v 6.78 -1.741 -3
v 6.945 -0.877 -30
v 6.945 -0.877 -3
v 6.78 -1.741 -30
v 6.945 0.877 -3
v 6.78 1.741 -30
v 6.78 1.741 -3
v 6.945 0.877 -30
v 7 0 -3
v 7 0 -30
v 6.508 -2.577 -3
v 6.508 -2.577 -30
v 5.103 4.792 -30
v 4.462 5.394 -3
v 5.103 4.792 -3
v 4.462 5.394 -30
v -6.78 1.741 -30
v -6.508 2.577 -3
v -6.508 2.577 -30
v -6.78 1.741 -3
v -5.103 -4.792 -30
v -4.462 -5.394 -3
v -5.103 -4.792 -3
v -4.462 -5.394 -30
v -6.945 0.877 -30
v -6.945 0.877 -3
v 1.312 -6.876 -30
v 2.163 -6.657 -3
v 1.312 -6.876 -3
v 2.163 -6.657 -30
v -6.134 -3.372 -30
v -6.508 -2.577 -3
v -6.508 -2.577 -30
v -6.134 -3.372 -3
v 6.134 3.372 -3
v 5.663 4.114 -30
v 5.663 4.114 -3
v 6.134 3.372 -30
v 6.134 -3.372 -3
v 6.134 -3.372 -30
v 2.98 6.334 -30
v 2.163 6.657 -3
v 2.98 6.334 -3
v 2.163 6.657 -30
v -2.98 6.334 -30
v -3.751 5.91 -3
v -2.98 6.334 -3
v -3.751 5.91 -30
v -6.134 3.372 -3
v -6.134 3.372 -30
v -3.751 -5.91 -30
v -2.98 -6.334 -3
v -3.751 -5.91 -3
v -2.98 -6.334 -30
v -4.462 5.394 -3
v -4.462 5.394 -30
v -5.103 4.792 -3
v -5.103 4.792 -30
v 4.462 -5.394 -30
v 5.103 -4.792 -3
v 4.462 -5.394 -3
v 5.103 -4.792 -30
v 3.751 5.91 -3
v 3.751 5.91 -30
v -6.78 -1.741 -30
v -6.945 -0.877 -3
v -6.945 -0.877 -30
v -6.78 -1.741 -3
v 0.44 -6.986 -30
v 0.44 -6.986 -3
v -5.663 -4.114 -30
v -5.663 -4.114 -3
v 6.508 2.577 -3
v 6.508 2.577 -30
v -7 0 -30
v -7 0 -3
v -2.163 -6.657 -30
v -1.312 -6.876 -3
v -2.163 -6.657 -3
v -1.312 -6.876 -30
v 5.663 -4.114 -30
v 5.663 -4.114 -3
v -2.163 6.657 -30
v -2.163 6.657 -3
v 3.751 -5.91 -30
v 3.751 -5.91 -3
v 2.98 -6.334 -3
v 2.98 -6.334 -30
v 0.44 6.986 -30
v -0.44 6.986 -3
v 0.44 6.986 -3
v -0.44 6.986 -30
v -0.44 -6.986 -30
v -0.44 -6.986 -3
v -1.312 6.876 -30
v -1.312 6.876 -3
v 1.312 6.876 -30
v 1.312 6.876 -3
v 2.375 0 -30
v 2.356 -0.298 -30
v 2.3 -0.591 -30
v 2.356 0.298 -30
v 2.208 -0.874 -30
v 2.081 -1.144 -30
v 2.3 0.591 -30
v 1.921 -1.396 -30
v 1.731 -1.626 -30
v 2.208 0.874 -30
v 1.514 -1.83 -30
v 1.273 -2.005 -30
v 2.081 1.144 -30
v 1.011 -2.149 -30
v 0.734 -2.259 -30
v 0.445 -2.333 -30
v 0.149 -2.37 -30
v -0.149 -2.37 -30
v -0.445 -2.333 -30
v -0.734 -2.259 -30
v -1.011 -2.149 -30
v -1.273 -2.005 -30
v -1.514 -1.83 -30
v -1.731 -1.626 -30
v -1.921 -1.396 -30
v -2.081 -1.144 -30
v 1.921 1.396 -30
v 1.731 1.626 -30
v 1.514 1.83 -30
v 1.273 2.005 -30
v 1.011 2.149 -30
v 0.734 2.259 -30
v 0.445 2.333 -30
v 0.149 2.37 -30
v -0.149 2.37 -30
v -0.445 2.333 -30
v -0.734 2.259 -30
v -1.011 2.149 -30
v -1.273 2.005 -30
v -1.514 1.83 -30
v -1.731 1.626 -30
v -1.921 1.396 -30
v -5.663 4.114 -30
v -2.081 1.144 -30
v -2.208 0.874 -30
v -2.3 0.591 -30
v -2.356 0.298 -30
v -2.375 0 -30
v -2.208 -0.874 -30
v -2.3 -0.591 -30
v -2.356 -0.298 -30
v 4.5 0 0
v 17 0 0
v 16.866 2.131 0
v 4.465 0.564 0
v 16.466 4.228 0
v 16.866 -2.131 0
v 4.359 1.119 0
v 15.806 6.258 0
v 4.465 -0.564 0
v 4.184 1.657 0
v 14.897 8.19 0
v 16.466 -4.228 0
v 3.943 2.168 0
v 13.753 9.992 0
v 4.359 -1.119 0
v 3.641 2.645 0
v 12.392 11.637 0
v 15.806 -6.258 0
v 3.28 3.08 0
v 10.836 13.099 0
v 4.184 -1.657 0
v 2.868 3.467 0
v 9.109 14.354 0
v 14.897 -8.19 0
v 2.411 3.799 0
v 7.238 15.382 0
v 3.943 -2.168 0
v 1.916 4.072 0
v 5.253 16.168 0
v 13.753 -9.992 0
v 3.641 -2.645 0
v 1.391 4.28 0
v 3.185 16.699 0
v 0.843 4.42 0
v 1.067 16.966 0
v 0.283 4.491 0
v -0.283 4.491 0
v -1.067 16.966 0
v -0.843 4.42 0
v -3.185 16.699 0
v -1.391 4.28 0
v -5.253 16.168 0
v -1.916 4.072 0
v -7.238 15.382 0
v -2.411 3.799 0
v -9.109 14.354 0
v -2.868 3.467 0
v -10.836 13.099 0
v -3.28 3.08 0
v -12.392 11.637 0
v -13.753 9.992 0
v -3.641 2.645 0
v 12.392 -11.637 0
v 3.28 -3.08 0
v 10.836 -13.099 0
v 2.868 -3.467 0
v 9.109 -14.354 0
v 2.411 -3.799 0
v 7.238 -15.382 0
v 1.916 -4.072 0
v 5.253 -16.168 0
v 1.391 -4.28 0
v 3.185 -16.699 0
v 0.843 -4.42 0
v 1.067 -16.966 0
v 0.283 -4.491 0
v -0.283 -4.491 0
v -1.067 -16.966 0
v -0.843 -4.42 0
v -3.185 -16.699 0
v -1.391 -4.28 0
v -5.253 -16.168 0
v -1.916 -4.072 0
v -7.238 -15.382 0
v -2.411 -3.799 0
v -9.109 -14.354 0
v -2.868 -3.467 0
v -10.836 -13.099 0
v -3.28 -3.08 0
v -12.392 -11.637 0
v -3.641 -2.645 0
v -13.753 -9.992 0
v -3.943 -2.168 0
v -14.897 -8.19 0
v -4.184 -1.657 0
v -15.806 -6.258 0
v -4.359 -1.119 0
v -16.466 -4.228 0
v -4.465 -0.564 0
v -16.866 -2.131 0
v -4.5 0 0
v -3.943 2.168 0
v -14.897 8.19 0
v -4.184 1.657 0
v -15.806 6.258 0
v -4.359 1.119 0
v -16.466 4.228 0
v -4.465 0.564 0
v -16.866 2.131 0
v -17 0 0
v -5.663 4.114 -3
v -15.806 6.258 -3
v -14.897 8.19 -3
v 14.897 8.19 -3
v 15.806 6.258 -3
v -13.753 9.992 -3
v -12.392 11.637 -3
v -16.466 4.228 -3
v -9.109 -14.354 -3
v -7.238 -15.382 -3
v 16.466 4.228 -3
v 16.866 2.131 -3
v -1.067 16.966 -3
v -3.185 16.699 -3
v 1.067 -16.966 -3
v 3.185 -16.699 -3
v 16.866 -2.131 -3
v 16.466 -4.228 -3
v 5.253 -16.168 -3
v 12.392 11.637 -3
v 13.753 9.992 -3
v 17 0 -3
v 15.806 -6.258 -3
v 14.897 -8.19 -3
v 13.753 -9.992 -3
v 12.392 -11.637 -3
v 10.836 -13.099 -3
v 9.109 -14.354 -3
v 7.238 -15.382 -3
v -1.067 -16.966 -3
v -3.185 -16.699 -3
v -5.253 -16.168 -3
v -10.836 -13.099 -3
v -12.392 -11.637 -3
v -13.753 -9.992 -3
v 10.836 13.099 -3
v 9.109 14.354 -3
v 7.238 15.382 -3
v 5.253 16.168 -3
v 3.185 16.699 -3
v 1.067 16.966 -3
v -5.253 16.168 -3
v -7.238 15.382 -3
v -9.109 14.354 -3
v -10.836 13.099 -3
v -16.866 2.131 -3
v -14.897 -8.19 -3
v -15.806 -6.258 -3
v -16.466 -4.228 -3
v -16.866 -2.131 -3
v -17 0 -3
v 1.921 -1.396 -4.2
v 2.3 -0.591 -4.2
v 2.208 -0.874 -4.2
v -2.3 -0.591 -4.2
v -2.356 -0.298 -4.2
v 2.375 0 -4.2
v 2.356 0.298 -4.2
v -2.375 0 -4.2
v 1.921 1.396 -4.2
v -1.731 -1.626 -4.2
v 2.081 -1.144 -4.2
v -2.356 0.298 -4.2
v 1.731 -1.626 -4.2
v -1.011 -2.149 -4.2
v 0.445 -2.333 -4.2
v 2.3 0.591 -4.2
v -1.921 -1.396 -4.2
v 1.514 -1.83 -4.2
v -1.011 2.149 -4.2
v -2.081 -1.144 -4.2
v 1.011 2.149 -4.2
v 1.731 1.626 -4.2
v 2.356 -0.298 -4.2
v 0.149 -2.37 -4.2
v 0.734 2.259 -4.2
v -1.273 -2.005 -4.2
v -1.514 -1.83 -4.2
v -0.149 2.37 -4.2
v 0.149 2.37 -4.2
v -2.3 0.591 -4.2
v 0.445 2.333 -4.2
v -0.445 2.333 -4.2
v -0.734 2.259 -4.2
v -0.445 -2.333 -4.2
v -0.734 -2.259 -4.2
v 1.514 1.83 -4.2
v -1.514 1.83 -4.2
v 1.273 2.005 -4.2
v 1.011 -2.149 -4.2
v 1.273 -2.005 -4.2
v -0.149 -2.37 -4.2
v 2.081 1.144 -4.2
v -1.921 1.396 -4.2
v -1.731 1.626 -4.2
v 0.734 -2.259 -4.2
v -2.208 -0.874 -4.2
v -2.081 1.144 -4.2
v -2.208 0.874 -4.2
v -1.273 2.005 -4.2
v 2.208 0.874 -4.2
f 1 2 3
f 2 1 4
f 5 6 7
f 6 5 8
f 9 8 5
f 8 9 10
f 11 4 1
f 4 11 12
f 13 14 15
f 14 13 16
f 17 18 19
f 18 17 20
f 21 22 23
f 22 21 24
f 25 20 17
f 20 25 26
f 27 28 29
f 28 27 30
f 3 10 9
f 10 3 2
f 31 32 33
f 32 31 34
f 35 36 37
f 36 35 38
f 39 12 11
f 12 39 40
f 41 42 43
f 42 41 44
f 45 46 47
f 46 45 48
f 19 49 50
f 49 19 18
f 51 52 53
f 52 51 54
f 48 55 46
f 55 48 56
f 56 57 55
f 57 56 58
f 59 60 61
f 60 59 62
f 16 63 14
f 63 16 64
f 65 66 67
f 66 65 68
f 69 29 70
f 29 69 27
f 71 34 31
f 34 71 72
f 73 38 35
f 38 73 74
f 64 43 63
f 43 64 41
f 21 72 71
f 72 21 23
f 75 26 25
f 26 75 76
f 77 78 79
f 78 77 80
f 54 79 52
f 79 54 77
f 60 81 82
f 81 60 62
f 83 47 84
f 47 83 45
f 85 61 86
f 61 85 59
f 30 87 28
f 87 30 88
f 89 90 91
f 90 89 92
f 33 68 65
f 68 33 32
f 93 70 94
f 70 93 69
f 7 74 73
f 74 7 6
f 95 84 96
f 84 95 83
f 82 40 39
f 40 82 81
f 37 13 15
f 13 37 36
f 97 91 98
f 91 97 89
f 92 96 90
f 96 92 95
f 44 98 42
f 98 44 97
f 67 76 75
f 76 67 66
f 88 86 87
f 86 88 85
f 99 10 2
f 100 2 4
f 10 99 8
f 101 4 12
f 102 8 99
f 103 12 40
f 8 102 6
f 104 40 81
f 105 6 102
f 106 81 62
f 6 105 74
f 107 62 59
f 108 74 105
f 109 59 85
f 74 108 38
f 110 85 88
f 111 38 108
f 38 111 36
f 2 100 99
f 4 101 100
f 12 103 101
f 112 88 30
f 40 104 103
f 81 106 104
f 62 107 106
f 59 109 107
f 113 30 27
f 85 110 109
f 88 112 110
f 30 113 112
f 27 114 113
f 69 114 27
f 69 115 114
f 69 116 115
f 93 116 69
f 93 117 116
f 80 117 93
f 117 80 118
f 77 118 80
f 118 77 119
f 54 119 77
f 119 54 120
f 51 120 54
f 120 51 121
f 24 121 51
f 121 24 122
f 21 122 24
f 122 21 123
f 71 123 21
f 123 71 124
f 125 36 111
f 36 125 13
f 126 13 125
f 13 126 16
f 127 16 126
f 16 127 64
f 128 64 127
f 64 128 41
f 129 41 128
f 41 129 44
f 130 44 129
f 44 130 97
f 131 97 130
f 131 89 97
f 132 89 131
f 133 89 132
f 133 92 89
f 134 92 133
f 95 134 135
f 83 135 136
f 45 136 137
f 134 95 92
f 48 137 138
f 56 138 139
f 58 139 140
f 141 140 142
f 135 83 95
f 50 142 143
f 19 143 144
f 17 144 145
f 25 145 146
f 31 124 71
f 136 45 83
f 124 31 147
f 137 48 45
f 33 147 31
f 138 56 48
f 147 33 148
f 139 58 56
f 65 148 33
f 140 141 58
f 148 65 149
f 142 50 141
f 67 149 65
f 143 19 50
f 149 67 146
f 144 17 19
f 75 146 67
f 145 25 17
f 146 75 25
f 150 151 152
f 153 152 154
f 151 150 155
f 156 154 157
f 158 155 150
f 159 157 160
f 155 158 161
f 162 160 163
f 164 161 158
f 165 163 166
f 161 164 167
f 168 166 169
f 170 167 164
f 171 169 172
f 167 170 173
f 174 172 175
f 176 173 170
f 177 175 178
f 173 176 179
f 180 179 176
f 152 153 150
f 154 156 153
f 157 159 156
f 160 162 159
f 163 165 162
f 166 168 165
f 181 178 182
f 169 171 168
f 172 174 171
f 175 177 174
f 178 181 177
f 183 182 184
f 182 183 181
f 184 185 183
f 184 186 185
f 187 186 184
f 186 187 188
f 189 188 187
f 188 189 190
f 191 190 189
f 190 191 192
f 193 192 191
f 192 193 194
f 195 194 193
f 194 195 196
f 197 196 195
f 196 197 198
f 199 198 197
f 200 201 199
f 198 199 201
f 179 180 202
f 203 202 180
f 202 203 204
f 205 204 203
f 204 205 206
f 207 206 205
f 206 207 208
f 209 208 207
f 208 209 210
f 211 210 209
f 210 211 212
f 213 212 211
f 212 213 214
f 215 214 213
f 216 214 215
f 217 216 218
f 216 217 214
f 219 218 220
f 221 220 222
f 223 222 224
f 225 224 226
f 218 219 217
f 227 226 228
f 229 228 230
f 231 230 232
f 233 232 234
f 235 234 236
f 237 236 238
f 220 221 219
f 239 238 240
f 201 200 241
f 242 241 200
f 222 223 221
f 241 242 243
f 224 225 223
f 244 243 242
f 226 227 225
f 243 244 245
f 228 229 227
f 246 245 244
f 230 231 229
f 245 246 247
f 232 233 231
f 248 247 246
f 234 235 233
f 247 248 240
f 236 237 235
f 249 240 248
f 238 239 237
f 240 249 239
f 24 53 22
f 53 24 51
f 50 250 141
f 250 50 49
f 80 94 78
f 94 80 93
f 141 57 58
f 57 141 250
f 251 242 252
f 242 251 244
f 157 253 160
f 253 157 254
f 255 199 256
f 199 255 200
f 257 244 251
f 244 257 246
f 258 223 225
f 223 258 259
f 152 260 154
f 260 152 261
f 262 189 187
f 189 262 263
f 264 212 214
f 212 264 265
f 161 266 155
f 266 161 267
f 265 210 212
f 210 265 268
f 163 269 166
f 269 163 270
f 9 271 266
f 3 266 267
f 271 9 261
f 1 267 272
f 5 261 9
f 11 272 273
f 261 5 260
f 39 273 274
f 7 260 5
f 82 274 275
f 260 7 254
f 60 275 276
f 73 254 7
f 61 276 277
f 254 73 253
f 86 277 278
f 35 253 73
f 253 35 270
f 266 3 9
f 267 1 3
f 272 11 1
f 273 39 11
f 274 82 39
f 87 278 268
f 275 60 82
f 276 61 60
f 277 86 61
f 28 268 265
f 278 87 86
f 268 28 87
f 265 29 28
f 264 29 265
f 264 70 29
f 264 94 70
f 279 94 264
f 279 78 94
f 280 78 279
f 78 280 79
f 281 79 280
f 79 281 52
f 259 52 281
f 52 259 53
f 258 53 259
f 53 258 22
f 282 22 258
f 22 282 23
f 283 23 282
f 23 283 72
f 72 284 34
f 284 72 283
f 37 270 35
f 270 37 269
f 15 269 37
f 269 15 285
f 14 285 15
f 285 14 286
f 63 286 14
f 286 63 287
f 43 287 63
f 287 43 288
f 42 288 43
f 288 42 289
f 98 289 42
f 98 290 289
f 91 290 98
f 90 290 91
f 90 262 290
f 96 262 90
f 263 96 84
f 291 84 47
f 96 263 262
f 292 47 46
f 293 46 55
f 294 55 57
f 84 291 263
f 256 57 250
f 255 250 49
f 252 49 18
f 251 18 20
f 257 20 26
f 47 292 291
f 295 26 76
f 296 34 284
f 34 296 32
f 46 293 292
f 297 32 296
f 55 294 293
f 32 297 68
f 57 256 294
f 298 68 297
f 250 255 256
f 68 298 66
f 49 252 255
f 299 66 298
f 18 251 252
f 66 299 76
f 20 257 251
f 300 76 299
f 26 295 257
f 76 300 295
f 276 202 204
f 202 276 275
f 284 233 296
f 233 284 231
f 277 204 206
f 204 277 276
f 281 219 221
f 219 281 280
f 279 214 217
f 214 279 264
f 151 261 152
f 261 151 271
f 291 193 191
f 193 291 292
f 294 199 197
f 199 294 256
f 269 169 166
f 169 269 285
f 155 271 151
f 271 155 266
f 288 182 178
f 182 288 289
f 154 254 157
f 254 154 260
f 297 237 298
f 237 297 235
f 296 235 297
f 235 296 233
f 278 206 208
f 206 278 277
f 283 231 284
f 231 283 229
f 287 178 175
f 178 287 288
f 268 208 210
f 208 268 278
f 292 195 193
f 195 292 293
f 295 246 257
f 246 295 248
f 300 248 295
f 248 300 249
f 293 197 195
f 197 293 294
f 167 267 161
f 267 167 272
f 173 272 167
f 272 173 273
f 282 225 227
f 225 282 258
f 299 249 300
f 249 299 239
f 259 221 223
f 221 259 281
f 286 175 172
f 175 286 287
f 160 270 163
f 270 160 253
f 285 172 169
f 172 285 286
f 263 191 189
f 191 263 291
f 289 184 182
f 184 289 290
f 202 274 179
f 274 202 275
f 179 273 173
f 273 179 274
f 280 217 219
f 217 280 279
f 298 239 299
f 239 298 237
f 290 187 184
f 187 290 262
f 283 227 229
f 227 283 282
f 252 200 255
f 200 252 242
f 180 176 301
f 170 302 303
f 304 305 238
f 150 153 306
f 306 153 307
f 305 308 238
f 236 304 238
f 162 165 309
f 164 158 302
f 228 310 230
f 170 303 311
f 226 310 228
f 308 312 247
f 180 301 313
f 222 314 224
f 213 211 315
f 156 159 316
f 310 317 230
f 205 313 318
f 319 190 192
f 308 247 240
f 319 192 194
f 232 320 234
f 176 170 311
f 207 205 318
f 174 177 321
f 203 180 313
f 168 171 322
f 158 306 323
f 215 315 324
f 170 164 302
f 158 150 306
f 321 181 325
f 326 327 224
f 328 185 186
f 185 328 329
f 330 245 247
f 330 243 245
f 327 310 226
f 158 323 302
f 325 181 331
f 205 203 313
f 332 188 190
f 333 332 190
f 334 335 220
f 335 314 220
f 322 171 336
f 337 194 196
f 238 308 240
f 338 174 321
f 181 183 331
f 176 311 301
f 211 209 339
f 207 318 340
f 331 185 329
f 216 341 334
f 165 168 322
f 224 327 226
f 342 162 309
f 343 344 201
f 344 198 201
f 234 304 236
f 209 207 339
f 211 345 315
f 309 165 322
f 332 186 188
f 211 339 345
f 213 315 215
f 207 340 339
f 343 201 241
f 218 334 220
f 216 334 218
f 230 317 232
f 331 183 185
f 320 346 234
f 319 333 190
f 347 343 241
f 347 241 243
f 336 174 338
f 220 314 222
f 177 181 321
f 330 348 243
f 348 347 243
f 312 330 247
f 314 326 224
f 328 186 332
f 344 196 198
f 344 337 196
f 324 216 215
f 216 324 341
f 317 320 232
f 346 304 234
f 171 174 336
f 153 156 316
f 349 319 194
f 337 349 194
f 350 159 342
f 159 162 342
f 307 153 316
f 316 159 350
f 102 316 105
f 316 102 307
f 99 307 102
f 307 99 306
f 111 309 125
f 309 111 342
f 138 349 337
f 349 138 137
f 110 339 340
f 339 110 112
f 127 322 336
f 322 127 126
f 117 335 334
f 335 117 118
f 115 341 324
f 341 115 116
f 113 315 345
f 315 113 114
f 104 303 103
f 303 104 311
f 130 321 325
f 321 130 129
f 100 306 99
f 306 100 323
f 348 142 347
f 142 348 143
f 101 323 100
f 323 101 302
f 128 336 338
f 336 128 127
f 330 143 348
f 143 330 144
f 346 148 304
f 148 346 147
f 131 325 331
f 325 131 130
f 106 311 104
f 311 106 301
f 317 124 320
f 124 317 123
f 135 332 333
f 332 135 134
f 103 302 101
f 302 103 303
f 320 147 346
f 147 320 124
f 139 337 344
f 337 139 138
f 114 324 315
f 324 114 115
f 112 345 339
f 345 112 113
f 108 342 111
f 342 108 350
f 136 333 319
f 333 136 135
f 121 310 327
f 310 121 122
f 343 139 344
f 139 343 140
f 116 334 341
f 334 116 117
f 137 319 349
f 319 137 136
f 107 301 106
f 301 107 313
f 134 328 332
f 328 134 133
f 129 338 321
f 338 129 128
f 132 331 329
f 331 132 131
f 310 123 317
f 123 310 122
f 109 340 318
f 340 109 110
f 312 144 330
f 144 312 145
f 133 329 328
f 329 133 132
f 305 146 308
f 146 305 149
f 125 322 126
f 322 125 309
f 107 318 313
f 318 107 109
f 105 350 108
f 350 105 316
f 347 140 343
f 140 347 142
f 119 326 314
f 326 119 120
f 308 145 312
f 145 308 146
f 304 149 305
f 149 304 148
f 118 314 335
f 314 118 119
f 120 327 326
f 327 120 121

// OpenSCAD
$fn = 50;


difference() {
	union() {
		translate(v = [0, 0, -30.0000000000]) {
			cylinder(h = 30, r = 7.0000000000);
		}
		translate(v = [0, 0, -3.0000000000]) {
			cylinder(h = 3, r = 17.0000000000);
		}
	}
	union() {
		translate(v = [0, 0, 0]) {
			rotate(a = [0, 0, 0]) {
				difference() {
					union() {
						#translate(v = [0, 0, -30.0000000000]) {
							cylinder(h = 30, r = 2.2500000000);
						}
						#translate(v = [0, 0, -4.2000000000]) {
							cylinder(h = 4.2000000000, r1 = 2.3750000000, r2 = 4.5000000000);
						}
						#translate(v = [0, 0, -30.0000000000]) {
							cylinder(h = 30, r = 2.3750000000);
						}
						#translate(v = [0, 0, -30.0000000000]) {
							cylinder(h = 30, r = 2.2500000000);
						}
					}
					union();
				}
			}
		}
	}
}
